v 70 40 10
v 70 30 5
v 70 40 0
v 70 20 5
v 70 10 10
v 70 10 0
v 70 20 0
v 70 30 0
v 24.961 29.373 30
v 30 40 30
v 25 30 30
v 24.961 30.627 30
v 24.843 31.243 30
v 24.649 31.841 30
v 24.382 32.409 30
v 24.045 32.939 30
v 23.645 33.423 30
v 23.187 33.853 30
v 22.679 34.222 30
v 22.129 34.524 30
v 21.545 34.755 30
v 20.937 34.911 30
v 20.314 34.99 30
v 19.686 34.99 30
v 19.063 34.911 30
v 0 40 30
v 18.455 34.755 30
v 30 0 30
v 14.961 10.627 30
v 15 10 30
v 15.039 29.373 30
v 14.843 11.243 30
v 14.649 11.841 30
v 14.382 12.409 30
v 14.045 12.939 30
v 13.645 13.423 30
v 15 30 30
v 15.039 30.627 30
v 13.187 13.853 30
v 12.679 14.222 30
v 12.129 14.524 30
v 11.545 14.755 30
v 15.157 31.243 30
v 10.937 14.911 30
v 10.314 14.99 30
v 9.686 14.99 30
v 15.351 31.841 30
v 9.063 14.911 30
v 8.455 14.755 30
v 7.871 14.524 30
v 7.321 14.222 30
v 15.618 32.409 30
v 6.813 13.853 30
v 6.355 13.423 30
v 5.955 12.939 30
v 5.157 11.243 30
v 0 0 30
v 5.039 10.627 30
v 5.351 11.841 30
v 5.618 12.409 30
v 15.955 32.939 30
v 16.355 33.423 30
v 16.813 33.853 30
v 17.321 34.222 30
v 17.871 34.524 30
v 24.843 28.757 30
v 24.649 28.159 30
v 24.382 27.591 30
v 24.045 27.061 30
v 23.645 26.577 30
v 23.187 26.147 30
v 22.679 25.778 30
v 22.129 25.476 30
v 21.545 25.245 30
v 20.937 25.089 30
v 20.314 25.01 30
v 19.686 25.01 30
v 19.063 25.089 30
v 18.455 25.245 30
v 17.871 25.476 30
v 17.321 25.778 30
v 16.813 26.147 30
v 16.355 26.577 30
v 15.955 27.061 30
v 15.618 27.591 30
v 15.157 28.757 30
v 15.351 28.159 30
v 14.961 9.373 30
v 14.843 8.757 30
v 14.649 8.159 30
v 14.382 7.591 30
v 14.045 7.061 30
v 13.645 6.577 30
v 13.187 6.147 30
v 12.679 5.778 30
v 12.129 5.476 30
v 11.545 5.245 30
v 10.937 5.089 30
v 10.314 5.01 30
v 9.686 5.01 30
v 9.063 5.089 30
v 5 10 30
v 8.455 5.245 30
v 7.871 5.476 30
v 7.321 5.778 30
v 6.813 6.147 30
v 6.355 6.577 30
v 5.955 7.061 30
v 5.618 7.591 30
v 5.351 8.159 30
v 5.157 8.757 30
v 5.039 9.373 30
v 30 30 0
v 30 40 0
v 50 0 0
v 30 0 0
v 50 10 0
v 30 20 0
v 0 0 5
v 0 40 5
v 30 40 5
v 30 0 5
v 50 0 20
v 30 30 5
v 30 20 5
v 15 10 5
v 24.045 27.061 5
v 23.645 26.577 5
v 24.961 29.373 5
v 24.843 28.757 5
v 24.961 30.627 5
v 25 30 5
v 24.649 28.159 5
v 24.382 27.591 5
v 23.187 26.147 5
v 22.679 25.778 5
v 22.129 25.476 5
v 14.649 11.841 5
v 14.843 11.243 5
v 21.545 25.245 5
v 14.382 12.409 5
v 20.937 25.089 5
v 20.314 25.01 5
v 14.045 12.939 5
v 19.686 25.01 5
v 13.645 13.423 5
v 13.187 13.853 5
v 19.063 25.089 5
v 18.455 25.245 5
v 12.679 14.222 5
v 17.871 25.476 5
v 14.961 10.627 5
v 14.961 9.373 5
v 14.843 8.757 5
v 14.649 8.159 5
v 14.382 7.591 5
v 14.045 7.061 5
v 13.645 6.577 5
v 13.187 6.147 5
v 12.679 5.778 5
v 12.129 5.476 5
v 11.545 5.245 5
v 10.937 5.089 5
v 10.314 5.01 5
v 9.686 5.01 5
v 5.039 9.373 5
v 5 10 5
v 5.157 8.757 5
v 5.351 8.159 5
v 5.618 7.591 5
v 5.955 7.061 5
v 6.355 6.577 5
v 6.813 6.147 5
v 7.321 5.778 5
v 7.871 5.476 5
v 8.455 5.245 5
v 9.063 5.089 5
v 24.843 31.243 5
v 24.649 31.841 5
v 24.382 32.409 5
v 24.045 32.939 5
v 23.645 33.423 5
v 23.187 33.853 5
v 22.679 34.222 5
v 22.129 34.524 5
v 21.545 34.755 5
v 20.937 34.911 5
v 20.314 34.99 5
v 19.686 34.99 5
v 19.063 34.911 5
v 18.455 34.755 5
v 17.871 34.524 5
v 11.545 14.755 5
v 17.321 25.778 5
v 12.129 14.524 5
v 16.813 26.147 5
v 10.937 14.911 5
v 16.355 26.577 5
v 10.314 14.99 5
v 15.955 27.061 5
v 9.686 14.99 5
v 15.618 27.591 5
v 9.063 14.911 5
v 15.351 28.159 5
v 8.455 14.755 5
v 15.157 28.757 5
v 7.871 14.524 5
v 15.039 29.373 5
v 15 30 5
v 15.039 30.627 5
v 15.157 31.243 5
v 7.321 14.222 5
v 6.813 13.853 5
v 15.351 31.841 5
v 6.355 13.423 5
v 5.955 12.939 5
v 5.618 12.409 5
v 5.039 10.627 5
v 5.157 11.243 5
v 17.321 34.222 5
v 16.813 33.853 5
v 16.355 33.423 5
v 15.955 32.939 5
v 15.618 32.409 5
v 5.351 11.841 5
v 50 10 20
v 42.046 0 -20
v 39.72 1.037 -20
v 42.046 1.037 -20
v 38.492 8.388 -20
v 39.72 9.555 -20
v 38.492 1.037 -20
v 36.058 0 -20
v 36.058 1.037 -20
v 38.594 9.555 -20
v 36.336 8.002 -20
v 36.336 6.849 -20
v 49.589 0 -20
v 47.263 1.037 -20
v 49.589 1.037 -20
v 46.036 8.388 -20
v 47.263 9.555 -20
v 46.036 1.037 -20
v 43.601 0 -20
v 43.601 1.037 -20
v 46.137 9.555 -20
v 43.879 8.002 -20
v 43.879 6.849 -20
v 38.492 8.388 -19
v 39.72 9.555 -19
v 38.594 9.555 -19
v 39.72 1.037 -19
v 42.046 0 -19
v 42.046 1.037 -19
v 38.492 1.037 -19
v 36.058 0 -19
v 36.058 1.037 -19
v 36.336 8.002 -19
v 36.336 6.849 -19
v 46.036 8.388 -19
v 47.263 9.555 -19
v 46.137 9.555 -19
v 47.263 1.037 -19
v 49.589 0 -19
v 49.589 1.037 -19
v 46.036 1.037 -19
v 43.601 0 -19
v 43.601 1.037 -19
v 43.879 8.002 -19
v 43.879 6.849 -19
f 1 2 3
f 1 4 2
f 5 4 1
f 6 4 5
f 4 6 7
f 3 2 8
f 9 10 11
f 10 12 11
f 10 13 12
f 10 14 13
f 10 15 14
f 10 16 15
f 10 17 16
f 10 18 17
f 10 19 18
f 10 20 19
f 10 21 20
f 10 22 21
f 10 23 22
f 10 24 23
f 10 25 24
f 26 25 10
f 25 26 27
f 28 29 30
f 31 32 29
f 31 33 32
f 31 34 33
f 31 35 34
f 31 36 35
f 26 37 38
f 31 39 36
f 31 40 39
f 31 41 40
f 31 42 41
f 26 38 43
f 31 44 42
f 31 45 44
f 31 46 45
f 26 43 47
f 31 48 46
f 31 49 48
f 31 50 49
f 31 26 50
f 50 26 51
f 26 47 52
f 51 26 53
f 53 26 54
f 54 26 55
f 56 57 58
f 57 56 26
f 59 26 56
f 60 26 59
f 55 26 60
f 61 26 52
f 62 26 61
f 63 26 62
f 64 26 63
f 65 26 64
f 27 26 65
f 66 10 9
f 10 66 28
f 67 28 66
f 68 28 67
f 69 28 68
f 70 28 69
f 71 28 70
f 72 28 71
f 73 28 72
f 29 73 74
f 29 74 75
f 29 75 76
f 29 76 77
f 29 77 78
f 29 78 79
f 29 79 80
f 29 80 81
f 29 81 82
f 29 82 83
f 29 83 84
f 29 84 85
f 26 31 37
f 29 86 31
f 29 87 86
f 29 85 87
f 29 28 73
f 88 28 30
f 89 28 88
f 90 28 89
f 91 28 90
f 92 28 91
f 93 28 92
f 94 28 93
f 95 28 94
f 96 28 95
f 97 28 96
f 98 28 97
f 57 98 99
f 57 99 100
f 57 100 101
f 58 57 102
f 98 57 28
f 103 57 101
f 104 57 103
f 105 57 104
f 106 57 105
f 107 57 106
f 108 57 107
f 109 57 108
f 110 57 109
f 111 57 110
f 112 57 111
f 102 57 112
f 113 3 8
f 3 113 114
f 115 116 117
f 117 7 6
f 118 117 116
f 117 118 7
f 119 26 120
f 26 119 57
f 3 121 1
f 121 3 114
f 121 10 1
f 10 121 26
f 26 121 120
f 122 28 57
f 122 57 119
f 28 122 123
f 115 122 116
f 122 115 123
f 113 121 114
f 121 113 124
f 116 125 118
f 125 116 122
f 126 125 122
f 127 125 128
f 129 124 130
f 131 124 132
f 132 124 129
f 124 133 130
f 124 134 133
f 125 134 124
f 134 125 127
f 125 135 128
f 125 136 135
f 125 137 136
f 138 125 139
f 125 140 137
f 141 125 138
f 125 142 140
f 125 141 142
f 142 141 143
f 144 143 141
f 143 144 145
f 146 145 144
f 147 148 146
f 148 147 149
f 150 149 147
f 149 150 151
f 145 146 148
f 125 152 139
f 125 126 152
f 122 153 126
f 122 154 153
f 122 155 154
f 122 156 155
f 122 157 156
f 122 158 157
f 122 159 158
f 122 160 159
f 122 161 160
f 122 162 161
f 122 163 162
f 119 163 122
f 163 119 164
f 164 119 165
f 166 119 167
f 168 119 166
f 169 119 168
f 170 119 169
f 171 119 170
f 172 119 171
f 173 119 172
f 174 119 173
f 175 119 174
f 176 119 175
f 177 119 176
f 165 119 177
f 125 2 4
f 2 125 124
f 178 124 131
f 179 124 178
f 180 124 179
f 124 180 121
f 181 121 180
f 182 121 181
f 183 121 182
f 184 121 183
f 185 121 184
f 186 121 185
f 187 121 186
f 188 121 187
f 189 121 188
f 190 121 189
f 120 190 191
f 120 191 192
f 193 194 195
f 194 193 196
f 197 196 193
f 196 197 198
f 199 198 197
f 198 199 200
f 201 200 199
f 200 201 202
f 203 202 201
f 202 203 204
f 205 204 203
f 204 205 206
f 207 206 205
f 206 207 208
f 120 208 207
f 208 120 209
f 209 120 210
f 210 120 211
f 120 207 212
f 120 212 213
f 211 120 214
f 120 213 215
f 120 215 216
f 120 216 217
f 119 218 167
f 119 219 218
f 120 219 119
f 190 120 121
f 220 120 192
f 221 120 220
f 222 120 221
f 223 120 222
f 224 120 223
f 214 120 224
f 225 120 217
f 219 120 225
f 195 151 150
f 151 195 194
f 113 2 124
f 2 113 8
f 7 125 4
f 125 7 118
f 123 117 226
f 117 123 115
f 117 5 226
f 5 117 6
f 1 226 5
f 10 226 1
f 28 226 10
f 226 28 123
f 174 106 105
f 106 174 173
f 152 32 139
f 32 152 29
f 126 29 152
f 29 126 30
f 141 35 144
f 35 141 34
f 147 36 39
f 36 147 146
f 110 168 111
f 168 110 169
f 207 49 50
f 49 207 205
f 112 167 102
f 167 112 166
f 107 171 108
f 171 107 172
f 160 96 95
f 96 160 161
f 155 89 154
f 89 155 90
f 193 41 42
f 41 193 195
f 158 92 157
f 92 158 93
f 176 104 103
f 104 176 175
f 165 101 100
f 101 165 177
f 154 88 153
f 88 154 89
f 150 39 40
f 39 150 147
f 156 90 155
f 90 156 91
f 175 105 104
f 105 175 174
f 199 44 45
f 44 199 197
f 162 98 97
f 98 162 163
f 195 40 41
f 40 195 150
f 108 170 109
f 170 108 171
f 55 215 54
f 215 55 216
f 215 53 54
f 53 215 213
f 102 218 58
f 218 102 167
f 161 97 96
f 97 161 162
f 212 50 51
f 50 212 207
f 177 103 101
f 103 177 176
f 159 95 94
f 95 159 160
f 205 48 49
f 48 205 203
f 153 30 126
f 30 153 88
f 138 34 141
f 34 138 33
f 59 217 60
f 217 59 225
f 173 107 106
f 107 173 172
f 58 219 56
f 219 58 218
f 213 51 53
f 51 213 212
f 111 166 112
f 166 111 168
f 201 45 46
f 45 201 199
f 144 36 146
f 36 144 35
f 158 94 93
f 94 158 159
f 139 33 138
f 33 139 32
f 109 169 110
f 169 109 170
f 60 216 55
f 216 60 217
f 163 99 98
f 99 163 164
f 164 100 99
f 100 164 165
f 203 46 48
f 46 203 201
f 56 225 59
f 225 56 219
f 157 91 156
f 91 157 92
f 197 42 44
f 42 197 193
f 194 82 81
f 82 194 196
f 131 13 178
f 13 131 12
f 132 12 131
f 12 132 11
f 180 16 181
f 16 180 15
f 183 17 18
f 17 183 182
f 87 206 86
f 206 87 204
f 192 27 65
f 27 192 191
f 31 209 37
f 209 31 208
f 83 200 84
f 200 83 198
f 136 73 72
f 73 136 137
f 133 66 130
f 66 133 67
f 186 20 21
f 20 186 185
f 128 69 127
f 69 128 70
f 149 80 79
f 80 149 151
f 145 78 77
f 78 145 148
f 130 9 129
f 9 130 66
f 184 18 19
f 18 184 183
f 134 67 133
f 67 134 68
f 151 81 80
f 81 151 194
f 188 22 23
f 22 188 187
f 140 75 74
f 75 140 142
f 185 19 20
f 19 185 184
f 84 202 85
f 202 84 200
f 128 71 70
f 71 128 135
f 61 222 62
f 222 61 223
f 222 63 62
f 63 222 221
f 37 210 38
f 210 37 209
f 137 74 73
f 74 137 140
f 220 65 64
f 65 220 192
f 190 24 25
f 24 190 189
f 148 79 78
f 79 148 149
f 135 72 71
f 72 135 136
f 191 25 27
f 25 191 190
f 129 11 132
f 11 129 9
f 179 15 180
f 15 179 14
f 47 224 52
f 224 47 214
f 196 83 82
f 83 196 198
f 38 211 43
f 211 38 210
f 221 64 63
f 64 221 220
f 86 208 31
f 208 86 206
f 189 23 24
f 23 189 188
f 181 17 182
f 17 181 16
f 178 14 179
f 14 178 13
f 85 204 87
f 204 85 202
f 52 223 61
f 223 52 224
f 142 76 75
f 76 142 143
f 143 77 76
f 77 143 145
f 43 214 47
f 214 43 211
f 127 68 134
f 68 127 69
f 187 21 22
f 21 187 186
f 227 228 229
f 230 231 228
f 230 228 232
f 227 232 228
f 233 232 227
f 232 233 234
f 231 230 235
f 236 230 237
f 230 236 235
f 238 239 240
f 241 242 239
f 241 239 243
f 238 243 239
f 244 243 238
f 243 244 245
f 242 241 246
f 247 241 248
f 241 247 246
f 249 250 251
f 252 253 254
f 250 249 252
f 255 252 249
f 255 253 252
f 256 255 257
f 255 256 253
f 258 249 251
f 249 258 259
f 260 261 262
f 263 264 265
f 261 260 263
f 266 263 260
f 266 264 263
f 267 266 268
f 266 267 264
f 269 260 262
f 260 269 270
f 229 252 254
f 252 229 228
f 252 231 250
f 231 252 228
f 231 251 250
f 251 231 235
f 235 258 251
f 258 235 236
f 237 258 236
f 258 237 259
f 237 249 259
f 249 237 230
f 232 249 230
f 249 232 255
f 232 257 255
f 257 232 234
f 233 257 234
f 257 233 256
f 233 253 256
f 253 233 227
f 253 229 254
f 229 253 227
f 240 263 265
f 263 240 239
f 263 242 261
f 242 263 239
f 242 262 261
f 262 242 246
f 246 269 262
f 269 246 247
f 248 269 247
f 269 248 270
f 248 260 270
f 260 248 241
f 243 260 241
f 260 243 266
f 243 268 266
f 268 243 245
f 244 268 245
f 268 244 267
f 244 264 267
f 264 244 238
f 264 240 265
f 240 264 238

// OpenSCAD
$fn=50;

cw=70;
cd=40;
ch=30;
cy=10;

difference() {
    cube([cw,cd,ch]);
    cube([30,cd,5]);
    translate([0,20,0])
    cube([cw,10,5]);
    translate([cw-20,0,0])
    cube([20,10,ch]);
    translate([0,cd,10])
    rotate([90,0,0])
    linear_extrude(height=cd)
    polygon([ [70,0],[70,ch-10],[cw-40,ch-10] ]);
    translate([10,10,0])
    cylinder(h=ch,d=10);
    translate([20,cd-10,0])
    cylinder(h=ch,d=10);

}
translate([cw/2,0,-20])
linear_extrude(height=1)
text("11");
